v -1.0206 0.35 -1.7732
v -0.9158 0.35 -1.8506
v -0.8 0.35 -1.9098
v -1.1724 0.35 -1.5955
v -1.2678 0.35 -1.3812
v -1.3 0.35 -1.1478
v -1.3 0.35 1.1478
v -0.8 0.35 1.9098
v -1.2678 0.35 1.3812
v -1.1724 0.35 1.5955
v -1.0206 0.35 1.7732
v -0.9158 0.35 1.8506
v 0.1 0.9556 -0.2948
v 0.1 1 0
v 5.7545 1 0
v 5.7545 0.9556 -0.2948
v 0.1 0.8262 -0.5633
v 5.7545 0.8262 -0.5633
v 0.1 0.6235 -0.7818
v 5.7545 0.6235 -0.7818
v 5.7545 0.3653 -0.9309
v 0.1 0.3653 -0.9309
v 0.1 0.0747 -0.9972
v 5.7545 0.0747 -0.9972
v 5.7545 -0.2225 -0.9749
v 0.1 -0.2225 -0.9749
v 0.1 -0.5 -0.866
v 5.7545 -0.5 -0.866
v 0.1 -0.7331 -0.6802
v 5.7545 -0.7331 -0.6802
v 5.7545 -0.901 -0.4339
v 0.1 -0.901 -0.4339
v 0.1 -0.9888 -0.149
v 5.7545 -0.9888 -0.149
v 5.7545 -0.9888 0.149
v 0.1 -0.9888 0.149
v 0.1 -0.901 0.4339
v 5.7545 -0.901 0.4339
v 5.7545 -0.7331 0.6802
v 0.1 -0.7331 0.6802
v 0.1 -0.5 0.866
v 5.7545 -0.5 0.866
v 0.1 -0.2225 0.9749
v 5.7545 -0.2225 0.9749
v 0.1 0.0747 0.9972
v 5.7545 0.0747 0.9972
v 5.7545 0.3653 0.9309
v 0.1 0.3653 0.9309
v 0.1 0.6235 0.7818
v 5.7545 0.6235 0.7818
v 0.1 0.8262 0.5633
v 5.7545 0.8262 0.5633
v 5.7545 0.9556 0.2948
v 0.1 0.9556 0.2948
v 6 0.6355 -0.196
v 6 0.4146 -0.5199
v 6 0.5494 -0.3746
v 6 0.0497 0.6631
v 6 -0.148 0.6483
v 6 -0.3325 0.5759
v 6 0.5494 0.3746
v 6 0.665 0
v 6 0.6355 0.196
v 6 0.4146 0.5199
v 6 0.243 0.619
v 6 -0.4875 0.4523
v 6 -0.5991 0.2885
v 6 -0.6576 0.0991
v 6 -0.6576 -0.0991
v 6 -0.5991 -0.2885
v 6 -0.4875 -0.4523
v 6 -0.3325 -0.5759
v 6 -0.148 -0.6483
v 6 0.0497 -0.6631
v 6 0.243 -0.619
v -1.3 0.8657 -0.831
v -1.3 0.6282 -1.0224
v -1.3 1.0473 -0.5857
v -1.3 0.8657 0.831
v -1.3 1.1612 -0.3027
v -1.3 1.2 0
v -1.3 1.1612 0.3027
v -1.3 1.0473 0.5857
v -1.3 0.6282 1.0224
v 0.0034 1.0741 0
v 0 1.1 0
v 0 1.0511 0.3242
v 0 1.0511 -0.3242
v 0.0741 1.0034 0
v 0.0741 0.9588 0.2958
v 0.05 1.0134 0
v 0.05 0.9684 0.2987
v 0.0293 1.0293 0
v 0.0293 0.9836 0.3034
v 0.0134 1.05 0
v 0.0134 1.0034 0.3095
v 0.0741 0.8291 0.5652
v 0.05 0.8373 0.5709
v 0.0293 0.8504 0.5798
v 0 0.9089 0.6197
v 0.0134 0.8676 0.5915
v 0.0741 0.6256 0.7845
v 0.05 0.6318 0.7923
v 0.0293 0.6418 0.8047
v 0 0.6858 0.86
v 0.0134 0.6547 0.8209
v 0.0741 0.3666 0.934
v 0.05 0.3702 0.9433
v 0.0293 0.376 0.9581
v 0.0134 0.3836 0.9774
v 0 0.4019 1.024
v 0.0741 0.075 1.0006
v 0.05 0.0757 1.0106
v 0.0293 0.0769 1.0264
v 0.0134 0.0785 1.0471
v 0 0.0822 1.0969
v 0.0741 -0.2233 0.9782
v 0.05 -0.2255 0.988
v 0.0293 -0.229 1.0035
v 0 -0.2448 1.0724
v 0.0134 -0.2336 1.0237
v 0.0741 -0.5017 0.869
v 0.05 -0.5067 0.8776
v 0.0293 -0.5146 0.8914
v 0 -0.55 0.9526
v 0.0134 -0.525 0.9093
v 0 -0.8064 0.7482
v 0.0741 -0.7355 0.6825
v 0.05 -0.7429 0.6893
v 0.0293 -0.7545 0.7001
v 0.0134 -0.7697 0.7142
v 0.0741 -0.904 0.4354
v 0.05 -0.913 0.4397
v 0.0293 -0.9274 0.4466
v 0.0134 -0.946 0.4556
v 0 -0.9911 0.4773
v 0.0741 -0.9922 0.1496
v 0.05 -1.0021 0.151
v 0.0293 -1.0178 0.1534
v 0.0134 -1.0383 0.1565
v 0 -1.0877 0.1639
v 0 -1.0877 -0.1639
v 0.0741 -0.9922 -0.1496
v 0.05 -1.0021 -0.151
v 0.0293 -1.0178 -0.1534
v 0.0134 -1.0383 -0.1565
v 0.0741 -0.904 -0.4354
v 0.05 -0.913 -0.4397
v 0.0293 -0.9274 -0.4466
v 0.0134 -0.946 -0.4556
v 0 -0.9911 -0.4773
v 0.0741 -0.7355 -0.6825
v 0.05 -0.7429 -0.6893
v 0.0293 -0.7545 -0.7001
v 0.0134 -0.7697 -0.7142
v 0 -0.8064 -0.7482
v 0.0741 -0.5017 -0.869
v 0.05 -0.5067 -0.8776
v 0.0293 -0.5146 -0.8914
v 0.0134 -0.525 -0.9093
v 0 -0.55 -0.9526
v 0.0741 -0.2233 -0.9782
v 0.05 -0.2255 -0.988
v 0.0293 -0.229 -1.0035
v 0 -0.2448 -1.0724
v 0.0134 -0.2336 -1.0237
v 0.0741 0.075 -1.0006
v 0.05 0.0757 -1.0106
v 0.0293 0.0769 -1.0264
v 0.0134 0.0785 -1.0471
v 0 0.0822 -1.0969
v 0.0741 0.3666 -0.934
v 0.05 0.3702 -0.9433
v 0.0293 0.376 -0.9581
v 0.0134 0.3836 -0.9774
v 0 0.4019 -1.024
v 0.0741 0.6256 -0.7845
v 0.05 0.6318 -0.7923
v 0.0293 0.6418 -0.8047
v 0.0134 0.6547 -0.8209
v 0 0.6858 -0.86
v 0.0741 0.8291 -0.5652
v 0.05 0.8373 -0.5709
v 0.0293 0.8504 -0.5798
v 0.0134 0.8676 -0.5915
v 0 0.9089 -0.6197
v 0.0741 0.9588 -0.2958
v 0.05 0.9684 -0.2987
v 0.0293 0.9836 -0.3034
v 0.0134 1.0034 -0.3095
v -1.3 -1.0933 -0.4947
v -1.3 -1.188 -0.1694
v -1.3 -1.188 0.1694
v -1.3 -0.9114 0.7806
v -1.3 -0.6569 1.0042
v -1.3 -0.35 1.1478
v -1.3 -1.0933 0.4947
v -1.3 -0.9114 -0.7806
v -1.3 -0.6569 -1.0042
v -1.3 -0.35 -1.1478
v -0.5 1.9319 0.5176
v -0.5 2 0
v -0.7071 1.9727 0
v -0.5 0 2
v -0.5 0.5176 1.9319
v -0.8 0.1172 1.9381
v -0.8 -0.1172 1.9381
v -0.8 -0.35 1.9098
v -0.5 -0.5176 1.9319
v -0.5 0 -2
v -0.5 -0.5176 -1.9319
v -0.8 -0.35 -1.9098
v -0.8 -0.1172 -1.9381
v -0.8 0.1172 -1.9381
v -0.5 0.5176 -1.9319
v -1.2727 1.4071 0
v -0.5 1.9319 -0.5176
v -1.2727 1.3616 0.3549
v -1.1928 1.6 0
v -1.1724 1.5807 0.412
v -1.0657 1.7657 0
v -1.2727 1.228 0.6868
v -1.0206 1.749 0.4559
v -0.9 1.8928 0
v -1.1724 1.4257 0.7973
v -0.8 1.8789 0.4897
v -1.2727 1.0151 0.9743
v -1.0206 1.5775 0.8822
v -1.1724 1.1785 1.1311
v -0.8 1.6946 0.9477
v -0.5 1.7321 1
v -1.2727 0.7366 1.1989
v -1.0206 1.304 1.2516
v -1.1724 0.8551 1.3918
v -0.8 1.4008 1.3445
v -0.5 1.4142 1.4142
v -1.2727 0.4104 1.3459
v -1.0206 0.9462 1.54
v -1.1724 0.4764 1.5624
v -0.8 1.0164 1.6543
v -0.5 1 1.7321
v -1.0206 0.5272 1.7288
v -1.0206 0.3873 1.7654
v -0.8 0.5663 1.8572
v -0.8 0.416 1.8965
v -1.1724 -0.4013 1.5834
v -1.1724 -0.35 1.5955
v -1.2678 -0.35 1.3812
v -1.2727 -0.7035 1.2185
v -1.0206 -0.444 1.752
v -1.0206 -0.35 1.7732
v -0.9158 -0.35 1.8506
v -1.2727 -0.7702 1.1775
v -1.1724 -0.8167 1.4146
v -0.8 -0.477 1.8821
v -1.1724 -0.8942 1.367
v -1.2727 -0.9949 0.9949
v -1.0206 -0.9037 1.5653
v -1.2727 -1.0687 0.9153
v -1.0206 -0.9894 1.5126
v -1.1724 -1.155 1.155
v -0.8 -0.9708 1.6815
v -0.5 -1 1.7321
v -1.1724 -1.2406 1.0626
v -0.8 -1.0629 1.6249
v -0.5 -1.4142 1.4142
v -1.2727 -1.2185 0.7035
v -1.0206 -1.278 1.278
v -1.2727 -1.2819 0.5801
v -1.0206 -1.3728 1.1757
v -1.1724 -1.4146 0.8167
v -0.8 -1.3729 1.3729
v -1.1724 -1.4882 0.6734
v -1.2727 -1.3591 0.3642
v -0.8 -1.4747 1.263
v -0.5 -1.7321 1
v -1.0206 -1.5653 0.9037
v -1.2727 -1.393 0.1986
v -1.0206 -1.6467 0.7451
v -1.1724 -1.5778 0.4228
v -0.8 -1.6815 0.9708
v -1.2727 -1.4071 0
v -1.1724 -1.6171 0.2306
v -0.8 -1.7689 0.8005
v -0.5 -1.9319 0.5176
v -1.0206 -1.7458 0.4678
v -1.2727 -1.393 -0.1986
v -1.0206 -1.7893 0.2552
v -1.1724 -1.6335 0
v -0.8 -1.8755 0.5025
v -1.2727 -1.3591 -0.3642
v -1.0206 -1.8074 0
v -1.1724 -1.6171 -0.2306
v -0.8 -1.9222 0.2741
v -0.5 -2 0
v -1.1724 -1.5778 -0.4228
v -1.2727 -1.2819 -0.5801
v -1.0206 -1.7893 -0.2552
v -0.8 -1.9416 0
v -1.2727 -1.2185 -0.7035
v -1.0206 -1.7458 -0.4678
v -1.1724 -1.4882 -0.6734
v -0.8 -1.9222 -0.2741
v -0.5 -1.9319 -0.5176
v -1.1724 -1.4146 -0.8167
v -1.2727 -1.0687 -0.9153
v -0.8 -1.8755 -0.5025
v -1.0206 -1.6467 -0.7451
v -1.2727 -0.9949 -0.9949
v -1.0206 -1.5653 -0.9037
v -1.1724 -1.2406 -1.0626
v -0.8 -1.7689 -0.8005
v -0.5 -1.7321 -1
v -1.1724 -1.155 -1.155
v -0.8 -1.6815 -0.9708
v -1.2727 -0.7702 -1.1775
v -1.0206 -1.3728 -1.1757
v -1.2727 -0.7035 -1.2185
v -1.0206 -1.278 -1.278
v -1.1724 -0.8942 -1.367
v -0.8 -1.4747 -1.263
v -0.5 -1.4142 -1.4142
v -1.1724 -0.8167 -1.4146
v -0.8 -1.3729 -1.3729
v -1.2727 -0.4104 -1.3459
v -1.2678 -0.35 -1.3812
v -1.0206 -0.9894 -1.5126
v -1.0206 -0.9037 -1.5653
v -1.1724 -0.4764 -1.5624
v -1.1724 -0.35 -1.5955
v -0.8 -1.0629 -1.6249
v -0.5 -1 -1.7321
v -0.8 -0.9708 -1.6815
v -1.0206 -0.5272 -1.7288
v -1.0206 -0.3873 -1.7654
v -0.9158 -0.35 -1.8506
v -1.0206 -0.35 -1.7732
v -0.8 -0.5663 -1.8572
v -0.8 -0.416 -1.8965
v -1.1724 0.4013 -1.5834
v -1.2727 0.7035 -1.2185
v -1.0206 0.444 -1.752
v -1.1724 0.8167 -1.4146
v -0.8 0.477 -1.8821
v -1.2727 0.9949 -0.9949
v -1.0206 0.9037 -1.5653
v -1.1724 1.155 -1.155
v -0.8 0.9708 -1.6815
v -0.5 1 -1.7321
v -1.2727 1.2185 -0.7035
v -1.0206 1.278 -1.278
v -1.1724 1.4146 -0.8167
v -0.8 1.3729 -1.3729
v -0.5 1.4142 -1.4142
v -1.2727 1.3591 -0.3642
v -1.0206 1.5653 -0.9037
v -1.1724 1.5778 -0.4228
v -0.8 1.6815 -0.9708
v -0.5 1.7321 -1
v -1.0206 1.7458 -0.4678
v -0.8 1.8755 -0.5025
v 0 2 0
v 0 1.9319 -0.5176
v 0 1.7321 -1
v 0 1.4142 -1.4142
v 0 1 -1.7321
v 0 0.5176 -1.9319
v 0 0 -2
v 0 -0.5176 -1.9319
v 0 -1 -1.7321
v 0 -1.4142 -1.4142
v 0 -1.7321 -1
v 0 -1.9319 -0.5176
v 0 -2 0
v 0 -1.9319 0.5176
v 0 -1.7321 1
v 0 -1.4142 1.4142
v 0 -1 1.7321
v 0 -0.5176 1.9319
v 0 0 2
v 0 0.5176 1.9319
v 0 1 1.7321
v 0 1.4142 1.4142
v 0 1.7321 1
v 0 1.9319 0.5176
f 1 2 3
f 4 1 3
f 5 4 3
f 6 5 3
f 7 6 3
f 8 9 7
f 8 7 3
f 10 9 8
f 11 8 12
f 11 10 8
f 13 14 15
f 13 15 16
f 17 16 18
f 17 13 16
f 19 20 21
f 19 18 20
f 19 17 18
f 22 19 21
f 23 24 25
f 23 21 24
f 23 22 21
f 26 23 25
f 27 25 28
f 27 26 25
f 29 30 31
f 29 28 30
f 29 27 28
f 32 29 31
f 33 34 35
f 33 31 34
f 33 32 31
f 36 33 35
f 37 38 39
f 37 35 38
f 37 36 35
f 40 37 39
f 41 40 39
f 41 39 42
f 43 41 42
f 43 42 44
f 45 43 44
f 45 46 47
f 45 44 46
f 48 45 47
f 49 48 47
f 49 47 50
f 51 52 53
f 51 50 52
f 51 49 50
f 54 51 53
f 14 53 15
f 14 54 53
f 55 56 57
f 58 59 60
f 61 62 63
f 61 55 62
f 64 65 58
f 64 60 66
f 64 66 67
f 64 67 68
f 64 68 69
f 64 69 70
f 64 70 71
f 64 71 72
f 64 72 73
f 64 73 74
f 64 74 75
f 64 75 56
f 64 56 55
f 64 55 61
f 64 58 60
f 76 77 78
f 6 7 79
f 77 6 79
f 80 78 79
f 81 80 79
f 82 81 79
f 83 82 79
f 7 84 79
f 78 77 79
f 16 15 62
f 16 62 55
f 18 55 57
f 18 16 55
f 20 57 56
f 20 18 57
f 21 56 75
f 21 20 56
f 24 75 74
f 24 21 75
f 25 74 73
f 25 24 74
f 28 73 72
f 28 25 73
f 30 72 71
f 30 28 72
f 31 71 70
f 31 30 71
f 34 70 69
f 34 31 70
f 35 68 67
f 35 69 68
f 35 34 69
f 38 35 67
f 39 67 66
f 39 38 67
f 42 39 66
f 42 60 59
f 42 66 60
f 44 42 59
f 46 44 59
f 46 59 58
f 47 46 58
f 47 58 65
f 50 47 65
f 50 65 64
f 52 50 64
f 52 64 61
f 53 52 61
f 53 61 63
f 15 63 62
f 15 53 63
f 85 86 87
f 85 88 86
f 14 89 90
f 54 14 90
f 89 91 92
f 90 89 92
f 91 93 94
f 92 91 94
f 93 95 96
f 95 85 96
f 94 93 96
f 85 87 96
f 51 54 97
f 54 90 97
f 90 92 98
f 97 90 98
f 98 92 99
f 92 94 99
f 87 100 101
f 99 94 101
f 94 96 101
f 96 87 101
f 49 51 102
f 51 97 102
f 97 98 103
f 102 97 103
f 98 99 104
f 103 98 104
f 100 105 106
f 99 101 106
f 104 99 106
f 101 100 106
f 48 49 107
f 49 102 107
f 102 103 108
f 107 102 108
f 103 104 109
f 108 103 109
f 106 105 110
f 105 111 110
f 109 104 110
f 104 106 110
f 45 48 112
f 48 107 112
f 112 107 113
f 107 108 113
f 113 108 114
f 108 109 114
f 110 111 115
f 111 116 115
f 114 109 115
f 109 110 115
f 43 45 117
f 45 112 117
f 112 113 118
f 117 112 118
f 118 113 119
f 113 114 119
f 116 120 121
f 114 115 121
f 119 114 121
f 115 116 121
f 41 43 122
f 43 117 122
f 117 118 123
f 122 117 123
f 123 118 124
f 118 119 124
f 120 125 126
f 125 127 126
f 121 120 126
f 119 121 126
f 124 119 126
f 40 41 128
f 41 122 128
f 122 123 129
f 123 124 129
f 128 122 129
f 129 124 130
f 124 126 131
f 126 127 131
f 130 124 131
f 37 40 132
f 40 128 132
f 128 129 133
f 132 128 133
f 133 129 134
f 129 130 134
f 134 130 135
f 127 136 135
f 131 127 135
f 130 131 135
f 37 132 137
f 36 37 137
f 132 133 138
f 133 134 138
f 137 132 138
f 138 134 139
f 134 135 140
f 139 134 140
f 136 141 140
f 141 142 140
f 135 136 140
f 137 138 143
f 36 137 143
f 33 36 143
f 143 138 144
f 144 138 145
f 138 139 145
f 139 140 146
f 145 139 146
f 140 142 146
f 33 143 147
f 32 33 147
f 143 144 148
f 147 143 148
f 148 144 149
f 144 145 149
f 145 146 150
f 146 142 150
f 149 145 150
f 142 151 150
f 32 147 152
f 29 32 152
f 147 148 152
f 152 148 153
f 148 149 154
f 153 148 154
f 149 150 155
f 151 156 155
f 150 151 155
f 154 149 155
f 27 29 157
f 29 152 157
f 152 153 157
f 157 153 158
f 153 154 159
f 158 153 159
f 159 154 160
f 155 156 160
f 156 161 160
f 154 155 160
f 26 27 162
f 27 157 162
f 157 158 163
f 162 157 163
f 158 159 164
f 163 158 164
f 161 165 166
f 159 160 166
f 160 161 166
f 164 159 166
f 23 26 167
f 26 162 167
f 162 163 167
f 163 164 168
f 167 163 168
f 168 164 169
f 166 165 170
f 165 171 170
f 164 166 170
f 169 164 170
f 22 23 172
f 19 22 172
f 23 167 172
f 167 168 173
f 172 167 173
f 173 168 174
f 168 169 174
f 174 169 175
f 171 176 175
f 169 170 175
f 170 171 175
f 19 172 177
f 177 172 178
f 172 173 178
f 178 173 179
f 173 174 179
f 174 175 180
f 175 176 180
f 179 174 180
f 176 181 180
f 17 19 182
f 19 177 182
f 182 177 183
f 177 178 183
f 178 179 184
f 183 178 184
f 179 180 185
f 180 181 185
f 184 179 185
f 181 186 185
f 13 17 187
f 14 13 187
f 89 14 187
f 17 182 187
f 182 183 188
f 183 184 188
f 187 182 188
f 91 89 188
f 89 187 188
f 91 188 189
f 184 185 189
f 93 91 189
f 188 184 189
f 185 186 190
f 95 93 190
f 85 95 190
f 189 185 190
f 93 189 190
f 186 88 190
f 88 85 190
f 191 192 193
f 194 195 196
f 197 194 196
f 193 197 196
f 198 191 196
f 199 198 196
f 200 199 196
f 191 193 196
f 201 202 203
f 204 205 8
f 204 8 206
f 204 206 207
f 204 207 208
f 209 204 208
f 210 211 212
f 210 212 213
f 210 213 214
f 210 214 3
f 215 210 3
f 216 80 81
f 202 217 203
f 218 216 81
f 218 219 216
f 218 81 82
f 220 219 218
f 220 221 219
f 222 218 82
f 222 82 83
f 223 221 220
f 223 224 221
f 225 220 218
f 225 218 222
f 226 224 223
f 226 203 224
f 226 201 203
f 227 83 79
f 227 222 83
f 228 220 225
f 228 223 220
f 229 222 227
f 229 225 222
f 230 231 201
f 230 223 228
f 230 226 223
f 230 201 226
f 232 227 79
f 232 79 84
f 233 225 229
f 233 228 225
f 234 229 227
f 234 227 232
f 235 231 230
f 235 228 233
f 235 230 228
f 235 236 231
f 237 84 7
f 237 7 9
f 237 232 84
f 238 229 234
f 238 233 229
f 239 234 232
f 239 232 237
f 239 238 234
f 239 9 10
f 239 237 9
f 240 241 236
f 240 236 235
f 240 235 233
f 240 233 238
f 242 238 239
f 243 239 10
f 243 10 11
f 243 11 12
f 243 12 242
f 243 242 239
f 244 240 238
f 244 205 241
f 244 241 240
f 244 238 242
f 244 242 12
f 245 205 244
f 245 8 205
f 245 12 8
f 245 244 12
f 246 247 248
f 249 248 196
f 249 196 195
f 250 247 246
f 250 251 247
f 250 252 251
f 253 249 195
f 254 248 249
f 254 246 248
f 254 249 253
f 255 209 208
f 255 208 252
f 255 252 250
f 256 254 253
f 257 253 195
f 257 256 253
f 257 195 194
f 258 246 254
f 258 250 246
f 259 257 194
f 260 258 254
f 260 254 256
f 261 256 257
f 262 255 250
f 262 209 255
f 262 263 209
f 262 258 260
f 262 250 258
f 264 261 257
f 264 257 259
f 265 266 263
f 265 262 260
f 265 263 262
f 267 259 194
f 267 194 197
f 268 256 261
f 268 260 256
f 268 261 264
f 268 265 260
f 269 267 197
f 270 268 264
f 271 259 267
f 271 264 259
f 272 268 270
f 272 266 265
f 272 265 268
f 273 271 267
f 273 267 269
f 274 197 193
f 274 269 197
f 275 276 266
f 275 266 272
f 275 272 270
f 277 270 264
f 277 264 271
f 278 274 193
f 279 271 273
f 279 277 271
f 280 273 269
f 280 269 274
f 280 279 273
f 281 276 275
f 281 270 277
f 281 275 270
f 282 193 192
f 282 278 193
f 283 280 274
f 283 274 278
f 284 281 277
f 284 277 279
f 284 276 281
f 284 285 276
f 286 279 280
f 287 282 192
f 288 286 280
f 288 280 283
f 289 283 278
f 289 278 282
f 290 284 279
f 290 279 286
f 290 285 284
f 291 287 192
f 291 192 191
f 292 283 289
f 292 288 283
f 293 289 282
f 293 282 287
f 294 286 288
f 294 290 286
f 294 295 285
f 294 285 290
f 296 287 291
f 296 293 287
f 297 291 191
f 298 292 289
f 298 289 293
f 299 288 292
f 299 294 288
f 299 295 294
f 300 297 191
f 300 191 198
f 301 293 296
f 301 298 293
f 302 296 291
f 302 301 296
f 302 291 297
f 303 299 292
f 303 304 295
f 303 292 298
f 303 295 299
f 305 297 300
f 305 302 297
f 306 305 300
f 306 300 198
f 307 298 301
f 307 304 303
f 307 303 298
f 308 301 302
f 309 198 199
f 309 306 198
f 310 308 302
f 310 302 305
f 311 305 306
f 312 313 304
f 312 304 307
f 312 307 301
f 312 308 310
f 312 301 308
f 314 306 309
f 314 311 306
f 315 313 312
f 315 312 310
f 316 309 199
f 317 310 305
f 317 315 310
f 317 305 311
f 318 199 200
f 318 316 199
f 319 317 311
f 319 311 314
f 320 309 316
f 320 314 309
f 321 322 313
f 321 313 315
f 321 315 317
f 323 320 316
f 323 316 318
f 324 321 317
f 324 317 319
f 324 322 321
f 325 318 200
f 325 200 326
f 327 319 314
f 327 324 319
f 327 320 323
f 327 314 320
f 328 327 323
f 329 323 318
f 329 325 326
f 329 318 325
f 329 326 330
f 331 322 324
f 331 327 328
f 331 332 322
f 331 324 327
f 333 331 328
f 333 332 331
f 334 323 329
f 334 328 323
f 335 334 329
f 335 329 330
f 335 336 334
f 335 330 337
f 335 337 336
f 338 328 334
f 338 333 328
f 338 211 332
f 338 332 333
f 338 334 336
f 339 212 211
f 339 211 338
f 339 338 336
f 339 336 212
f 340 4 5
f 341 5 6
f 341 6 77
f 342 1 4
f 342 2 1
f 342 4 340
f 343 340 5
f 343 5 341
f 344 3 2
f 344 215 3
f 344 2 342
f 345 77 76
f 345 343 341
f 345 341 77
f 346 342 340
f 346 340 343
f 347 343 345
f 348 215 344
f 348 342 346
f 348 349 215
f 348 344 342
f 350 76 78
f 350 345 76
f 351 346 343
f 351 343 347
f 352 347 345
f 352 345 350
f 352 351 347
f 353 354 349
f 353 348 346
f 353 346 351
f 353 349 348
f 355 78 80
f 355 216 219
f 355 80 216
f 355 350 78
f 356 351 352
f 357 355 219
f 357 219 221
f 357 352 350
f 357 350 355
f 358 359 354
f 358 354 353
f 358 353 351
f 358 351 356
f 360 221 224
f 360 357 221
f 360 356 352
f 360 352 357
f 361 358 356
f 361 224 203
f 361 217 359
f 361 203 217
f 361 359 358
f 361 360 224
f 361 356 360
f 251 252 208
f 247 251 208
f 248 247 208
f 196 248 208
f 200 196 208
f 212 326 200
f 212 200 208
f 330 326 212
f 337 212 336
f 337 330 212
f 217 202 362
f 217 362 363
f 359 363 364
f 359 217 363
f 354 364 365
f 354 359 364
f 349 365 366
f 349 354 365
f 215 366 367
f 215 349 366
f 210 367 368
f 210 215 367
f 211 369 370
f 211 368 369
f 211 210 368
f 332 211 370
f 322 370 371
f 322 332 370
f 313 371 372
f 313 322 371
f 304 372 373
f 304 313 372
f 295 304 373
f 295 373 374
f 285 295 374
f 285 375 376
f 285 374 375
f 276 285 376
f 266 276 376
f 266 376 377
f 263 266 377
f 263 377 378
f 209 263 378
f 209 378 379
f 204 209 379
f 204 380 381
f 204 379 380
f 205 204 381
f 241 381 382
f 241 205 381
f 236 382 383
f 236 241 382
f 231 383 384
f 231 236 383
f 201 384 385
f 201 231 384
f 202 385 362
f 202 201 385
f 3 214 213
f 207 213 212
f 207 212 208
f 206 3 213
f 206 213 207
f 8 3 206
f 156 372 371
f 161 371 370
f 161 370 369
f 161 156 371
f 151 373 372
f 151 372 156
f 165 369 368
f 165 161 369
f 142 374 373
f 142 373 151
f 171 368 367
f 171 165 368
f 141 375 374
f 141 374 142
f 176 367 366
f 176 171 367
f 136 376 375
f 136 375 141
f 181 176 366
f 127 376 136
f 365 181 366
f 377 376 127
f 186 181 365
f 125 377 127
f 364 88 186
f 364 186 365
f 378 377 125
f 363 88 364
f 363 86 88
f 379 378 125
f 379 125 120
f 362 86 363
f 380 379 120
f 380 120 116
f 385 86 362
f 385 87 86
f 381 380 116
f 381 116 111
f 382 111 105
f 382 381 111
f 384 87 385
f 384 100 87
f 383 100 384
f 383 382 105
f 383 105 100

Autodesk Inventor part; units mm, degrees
ref_plane "YZ Plane" through (0, 0, 0) normal (1, 0, 0) x (0, 1, 0)
ref_plane "XZ Plane" through (0, 0, 0) normal (0, 1, 0) x (-1, 0, 0)
sketch "Sketch1" plane through (0, 0, 0) normal (0, 0, 1) x (1, 0, 0)
  line L0 (-1.3, 0) -> (6, 0)
  line L1 (6, 0) -> (6, 1)
  line L2 (6, 1) -> (0.4, 1)
  line L3 (0.4, 1) -> (0.1545, 1)
  line L4 (0.1545, 1) -> (0, 1)
  line L5 (0, 1) -> (0, 2)
  line L6 (-2.76, 0) -> (7.46, 0) projected
  line L7 (0, -0.4) -> (0, 2.4) projected
  line L8 (-1.3, 0) -> (-1.3, 2)
  line L9 (0, 2) -> (-1.3, 2)
  line L10 (0.4, 1) -> (0, 1) construction
  dimension "d0" = 6
  dimension "d1" = 5.6
  dimension "d2" = 0.2455
  dimension "d3" = 1.3
  dimension "d4" = 2
  dimension "d5" = 2
  dimension "d9" = 4
  dimension "d10" = 0
revolve "Body" add sketch "Sketch1" angle 360 about axis through (-1.3, 0, 0) along (1, 0, 0)
sketch "Sketch2" plane through (-1.3, 0, 0) normal (-1, 0, 0) x (0, 0, 1)
  circle A0 centre (0, 0) radius 2 projected
  line L0 (0, 0) -> (0, 2) projected
  line L1 (-2, 0.35) -> (2, 0.35)
  line L2 (2, 0.35) -> (2, -0.35)
  line L3 (2, -0.35) -> (-2, -0.35)
  line L4 (-2, -0.35) -> (-2, 0.35)
  line L5 (-2, 0) -> (2, 0) construction
  line L6 (0, 0.35) -> (0, -0.35) construction
  dimension "d11" = 0.7
  dimension "d12" = 4
fillet "Fillet1" radius 0.8 1 edges at (-1.3, -2, 0)
extrude "Slot" cut sketch "Sketch2" against normal blind 0.5 contours A0 L3 L1 | L2 L3 A0 | A0 L1 L2 | L3 L4 A0 | A0 L4 L1
thread "Thread" size "M2x0.4" class "6g" standard "ISO Metric profile" length 5.6
chamfer "Chamfer1" distance 0.335 distance2 0.2455 1 edges at (6, -1, 0) measured on face at (6, 0.2495, 0.221)
ref_plane "Work Plane1" through (30.1625, 0, 0) normal (0, 0, -1) x (1, 0, 0)
fillet "Fillet2" radius 0.1 1 edges at (0, -1, 0)
equation "\"d11\" = SBR"
equation "\"d12\" = KOD"
equation "\"d14\" = RR"
equation "\"d19\" = STI"
equation "\"d15\" = GEL"
equation "\"d17\" = -0.5 * SPD + 0.5 * GD"
equation "\"d40\" = R"
equation "\"d0\" = NLG"
equation "\"d1\" = GEL"
equation "\"d3\" = KOH"
equation "\"d4\" = GD"
equation "\"d5\" = BDM"
equation "\"d9\" = KOD"
equation "\"GD\" = NND"
equation "\"NLG\" = 6"
equation "\"GEL\" = 5.6"
equation "\"KOD\" = 4"
equation "\"KOH\" = 1.3"
equation "\"GAL\" = 0.61345 * PTC"
equation "\"SPD\" = 1.33"
equation "\"BDM\" = NND"
equation "\"GUL\" = 0.61345 * PTC"
equation "\"RR\" = 0.8"
equation "\"SBR\" = 0.7"
equation "\"STI\" = 0.5"
equation "\"KEWI\" = 0"
equation "\"R\" = 0.1"
equation "\"PTC\" = 0.4"
equation "\"THREADDIA\" = 2"
equation "\"TOA\" = 30deg"
equation "\"NND\" = 2"
equation "\"GD1\" = THREADDIA - 1.2269 * PTC"
properties part number "ANSI B18.6.7M - M2x0.4 x 6" material "Steel, Mild"
